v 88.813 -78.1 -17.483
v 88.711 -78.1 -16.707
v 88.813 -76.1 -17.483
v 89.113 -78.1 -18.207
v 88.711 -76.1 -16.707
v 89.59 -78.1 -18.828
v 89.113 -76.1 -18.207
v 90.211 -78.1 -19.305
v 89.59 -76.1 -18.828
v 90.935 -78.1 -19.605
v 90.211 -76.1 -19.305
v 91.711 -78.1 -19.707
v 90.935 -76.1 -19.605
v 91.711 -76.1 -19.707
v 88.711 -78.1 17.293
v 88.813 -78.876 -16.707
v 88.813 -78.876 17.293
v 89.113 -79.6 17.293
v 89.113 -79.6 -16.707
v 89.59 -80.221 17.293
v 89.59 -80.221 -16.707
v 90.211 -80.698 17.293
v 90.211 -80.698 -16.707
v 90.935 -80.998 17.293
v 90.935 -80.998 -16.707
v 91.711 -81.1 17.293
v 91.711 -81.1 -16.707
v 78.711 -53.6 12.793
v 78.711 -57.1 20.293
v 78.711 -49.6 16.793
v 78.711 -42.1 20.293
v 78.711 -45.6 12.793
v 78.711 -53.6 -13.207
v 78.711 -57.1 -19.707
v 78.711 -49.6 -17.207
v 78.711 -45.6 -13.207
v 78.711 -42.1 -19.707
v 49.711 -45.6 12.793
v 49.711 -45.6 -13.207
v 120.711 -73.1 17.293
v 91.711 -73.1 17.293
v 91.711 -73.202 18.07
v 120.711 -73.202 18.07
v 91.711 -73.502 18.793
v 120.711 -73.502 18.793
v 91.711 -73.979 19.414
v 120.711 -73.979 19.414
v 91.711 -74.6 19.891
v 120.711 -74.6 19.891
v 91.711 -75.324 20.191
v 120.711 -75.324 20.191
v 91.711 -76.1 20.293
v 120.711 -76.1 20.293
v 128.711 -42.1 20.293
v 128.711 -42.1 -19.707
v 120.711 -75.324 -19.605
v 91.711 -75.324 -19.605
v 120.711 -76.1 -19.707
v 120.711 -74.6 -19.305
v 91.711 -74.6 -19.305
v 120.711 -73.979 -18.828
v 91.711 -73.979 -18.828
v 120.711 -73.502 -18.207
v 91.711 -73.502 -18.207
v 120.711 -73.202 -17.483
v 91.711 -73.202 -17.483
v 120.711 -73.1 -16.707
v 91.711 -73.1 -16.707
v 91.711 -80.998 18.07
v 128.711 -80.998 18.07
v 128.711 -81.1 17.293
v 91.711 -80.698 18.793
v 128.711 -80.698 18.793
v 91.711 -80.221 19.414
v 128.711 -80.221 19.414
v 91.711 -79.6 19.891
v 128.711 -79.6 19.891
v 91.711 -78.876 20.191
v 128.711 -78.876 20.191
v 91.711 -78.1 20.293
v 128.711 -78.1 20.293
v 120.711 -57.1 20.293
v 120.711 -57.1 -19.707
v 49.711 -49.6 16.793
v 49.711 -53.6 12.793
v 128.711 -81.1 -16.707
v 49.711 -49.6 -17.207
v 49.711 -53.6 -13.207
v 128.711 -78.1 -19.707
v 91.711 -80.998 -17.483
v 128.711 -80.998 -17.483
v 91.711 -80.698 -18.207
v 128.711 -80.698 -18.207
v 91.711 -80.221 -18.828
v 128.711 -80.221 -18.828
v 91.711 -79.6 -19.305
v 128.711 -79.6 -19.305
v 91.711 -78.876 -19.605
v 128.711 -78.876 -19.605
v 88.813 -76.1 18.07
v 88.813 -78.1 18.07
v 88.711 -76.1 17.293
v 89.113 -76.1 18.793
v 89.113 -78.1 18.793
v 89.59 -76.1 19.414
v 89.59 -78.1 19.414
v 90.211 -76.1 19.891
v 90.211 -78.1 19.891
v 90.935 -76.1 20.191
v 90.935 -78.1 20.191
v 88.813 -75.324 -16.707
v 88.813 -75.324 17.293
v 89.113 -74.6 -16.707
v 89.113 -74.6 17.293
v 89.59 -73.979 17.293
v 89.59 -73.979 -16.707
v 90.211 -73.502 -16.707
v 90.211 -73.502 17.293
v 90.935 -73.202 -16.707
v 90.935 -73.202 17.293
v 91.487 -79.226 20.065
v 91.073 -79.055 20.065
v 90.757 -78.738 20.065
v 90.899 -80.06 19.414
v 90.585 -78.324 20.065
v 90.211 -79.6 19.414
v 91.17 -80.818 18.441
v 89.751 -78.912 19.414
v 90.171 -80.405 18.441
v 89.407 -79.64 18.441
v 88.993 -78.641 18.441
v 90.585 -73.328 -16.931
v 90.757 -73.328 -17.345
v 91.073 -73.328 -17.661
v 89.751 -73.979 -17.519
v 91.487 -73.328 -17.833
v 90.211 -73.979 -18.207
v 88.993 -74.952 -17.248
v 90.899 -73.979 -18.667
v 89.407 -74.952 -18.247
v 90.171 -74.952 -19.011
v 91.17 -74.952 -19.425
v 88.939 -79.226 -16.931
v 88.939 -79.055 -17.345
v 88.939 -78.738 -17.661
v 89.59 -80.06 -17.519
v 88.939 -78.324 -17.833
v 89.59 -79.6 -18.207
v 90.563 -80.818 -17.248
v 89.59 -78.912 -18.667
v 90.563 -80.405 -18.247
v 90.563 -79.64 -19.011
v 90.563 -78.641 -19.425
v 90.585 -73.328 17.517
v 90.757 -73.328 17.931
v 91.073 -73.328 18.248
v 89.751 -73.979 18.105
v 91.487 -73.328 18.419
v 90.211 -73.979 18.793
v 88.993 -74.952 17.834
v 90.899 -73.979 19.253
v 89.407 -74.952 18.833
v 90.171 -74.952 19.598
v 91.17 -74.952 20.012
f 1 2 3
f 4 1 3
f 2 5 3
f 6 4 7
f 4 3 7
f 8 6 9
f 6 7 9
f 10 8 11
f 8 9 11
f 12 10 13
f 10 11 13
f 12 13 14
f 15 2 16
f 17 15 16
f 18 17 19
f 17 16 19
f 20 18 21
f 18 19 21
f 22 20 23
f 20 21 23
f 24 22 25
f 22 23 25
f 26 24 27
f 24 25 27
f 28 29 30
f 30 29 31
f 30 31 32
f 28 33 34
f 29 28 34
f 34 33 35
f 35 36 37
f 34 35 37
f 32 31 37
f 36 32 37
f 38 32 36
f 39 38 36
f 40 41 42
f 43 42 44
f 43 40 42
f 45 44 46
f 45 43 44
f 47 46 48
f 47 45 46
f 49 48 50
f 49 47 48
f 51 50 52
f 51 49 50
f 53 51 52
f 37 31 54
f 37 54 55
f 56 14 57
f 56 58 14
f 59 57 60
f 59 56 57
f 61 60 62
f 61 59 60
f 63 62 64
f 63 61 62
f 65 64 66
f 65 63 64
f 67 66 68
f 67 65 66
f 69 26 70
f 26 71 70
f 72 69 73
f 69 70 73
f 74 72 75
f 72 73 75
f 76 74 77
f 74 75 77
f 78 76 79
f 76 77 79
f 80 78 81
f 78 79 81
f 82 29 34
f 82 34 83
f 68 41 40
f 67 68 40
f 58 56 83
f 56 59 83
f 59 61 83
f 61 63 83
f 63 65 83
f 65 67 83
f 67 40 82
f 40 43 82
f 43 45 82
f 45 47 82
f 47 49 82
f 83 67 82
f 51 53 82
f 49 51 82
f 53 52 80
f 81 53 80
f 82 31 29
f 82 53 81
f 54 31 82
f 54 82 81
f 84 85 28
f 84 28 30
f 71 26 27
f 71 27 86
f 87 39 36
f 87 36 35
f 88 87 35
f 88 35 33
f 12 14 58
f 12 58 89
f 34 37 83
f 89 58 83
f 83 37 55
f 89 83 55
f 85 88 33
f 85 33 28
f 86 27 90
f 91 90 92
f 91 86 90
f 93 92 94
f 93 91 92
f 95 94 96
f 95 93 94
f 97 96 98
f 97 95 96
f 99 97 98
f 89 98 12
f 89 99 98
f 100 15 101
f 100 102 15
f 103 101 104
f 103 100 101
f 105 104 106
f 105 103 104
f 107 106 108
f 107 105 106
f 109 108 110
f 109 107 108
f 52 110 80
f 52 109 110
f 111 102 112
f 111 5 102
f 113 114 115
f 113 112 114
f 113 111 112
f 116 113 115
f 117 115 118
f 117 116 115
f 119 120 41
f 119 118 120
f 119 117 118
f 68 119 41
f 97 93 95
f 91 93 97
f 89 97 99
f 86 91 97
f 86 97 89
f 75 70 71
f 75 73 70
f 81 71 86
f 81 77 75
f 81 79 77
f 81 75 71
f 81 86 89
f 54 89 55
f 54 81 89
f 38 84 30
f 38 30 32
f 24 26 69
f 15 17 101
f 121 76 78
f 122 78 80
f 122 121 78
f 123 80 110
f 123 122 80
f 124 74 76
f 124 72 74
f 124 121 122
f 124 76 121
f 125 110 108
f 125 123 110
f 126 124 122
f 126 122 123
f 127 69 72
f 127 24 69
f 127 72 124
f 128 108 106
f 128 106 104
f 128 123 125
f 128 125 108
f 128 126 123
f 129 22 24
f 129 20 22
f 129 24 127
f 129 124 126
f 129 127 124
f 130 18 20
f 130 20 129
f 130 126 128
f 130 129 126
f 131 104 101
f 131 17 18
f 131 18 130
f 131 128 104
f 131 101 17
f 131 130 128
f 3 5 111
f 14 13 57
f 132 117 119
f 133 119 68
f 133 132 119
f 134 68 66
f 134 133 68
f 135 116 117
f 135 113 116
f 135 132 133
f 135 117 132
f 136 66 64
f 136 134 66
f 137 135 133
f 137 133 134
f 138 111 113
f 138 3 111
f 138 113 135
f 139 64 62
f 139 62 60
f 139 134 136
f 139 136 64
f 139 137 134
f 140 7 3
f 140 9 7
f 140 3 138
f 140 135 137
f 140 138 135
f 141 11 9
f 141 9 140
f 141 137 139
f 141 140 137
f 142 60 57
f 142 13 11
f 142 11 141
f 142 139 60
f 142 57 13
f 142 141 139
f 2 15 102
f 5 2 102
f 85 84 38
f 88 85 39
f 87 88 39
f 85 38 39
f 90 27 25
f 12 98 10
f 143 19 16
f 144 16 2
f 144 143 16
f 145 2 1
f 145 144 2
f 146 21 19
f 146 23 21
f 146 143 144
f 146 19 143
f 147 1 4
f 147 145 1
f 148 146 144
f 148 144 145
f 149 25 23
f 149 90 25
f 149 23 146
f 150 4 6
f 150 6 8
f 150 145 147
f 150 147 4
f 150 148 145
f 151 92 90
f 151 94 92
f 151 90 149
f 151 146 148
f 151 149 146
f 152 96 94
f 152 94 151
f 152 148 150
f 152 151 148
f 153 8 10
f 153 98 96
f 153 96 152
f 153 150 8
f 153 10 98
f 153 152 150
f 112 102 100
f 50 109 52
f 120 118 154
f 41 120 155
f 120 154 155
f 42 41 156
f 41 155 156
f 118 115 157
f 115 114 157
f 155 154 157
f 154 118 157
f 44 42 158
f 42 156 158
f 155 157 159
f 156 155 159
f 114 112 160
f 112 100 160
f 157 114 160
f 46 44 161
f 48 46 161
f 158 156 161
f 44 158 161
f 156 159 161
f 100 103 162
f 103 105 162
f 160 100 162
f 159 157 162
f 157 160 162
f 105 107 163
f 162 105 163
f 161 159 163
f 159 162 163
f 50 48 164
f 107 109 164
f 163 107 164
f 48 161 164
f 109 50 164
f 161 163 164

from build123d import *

# Parameters (mm, degrees)
SKETCH049_W             = 40
SKETCH049_H             = 15
PAD018_DEPTH            = 79
SKETCH050_W             = 40
SKETCH050_H             = 15
POCKET029_DEPTH         = 29
SKETCH051_W             = 40
SKETCH051_H             = 24
PAD019_DEPTH            = 40
SKETCH052_W             = 32
SKETCH052_H             = 16
POCKET030_DEPTH         = 40.001
FILLET008_R             = 3
BODY007_PLACEMENT_ANGLE = 90


with BuildPart() as part:
    # Sketch049 → Pad018 (new body)
    with BuildSketch(Plane.YZ):
        with Locations((20, 7.5)):
            Rectangle(SKETCH049_W, SKETCH049_H)
    extrude(amount=PAD018_DEPTH)

    # Sketch050 → Pocket029 (cut)
    with BuildSketch(Plane.YZ):
        with Locations((20, 7.5)):
            Rectangle(SKETCH050_W, SKETCH050_H)
        Polygon((3.5, 7.5), (7.5, 11.5), (33.5, 11.5), (37.5, 7.5), (33.5, 3.5), (7.5, 3.5), align=None, mode=Mode.SUBTRACT)
    extrude(amount=POCKET029_DEPTH, mode=Mode.SUBTRACT)

    # Sketch051 → Pad019 (join)
    with BuildSketch(Plane.XZ):
        with Locations((59, -12)):
            Rectangle(SKETCH051_W, SKETCH051_H)
    extrude(amount=-PAD019_DEPTH)

    # Sketch052 → Pocket030 (cut, through all)
    with BuildSketch(Plane.XZ):
        with Locations((55, -8)):
            Rectangle(SKETCH052_W, SKETCH052_H)
    extrude(amount=-POCKET030_DEPTH, mode=Mode.SUBTRACT)

    # Fillet008
    fillet008_edges = [part.edges().sort_by_distance(p)[0] for p in [
        (59, 40, -24),
        (39, 20, -24),
        (59, 0, -24),
        (39, 0, -20),
        (39, 40, -20),
        (39, 20, -16),
        (55, 0, -16),
        (55, 40, -16),
    ]]
    fillet(fillet008_edges, radius=FILLET008_R)


with BuildPart() as part_1:
    # Body007 placement: moved
    add(part.part.moved(Location((49.711133, -57.1, 20.293142))).rotate(Axis((49.711133, -57.1, 20.293142), (-1, 0, 0)), BODY007_PLACEMENT_ANGLE))


solid = part_1.part
